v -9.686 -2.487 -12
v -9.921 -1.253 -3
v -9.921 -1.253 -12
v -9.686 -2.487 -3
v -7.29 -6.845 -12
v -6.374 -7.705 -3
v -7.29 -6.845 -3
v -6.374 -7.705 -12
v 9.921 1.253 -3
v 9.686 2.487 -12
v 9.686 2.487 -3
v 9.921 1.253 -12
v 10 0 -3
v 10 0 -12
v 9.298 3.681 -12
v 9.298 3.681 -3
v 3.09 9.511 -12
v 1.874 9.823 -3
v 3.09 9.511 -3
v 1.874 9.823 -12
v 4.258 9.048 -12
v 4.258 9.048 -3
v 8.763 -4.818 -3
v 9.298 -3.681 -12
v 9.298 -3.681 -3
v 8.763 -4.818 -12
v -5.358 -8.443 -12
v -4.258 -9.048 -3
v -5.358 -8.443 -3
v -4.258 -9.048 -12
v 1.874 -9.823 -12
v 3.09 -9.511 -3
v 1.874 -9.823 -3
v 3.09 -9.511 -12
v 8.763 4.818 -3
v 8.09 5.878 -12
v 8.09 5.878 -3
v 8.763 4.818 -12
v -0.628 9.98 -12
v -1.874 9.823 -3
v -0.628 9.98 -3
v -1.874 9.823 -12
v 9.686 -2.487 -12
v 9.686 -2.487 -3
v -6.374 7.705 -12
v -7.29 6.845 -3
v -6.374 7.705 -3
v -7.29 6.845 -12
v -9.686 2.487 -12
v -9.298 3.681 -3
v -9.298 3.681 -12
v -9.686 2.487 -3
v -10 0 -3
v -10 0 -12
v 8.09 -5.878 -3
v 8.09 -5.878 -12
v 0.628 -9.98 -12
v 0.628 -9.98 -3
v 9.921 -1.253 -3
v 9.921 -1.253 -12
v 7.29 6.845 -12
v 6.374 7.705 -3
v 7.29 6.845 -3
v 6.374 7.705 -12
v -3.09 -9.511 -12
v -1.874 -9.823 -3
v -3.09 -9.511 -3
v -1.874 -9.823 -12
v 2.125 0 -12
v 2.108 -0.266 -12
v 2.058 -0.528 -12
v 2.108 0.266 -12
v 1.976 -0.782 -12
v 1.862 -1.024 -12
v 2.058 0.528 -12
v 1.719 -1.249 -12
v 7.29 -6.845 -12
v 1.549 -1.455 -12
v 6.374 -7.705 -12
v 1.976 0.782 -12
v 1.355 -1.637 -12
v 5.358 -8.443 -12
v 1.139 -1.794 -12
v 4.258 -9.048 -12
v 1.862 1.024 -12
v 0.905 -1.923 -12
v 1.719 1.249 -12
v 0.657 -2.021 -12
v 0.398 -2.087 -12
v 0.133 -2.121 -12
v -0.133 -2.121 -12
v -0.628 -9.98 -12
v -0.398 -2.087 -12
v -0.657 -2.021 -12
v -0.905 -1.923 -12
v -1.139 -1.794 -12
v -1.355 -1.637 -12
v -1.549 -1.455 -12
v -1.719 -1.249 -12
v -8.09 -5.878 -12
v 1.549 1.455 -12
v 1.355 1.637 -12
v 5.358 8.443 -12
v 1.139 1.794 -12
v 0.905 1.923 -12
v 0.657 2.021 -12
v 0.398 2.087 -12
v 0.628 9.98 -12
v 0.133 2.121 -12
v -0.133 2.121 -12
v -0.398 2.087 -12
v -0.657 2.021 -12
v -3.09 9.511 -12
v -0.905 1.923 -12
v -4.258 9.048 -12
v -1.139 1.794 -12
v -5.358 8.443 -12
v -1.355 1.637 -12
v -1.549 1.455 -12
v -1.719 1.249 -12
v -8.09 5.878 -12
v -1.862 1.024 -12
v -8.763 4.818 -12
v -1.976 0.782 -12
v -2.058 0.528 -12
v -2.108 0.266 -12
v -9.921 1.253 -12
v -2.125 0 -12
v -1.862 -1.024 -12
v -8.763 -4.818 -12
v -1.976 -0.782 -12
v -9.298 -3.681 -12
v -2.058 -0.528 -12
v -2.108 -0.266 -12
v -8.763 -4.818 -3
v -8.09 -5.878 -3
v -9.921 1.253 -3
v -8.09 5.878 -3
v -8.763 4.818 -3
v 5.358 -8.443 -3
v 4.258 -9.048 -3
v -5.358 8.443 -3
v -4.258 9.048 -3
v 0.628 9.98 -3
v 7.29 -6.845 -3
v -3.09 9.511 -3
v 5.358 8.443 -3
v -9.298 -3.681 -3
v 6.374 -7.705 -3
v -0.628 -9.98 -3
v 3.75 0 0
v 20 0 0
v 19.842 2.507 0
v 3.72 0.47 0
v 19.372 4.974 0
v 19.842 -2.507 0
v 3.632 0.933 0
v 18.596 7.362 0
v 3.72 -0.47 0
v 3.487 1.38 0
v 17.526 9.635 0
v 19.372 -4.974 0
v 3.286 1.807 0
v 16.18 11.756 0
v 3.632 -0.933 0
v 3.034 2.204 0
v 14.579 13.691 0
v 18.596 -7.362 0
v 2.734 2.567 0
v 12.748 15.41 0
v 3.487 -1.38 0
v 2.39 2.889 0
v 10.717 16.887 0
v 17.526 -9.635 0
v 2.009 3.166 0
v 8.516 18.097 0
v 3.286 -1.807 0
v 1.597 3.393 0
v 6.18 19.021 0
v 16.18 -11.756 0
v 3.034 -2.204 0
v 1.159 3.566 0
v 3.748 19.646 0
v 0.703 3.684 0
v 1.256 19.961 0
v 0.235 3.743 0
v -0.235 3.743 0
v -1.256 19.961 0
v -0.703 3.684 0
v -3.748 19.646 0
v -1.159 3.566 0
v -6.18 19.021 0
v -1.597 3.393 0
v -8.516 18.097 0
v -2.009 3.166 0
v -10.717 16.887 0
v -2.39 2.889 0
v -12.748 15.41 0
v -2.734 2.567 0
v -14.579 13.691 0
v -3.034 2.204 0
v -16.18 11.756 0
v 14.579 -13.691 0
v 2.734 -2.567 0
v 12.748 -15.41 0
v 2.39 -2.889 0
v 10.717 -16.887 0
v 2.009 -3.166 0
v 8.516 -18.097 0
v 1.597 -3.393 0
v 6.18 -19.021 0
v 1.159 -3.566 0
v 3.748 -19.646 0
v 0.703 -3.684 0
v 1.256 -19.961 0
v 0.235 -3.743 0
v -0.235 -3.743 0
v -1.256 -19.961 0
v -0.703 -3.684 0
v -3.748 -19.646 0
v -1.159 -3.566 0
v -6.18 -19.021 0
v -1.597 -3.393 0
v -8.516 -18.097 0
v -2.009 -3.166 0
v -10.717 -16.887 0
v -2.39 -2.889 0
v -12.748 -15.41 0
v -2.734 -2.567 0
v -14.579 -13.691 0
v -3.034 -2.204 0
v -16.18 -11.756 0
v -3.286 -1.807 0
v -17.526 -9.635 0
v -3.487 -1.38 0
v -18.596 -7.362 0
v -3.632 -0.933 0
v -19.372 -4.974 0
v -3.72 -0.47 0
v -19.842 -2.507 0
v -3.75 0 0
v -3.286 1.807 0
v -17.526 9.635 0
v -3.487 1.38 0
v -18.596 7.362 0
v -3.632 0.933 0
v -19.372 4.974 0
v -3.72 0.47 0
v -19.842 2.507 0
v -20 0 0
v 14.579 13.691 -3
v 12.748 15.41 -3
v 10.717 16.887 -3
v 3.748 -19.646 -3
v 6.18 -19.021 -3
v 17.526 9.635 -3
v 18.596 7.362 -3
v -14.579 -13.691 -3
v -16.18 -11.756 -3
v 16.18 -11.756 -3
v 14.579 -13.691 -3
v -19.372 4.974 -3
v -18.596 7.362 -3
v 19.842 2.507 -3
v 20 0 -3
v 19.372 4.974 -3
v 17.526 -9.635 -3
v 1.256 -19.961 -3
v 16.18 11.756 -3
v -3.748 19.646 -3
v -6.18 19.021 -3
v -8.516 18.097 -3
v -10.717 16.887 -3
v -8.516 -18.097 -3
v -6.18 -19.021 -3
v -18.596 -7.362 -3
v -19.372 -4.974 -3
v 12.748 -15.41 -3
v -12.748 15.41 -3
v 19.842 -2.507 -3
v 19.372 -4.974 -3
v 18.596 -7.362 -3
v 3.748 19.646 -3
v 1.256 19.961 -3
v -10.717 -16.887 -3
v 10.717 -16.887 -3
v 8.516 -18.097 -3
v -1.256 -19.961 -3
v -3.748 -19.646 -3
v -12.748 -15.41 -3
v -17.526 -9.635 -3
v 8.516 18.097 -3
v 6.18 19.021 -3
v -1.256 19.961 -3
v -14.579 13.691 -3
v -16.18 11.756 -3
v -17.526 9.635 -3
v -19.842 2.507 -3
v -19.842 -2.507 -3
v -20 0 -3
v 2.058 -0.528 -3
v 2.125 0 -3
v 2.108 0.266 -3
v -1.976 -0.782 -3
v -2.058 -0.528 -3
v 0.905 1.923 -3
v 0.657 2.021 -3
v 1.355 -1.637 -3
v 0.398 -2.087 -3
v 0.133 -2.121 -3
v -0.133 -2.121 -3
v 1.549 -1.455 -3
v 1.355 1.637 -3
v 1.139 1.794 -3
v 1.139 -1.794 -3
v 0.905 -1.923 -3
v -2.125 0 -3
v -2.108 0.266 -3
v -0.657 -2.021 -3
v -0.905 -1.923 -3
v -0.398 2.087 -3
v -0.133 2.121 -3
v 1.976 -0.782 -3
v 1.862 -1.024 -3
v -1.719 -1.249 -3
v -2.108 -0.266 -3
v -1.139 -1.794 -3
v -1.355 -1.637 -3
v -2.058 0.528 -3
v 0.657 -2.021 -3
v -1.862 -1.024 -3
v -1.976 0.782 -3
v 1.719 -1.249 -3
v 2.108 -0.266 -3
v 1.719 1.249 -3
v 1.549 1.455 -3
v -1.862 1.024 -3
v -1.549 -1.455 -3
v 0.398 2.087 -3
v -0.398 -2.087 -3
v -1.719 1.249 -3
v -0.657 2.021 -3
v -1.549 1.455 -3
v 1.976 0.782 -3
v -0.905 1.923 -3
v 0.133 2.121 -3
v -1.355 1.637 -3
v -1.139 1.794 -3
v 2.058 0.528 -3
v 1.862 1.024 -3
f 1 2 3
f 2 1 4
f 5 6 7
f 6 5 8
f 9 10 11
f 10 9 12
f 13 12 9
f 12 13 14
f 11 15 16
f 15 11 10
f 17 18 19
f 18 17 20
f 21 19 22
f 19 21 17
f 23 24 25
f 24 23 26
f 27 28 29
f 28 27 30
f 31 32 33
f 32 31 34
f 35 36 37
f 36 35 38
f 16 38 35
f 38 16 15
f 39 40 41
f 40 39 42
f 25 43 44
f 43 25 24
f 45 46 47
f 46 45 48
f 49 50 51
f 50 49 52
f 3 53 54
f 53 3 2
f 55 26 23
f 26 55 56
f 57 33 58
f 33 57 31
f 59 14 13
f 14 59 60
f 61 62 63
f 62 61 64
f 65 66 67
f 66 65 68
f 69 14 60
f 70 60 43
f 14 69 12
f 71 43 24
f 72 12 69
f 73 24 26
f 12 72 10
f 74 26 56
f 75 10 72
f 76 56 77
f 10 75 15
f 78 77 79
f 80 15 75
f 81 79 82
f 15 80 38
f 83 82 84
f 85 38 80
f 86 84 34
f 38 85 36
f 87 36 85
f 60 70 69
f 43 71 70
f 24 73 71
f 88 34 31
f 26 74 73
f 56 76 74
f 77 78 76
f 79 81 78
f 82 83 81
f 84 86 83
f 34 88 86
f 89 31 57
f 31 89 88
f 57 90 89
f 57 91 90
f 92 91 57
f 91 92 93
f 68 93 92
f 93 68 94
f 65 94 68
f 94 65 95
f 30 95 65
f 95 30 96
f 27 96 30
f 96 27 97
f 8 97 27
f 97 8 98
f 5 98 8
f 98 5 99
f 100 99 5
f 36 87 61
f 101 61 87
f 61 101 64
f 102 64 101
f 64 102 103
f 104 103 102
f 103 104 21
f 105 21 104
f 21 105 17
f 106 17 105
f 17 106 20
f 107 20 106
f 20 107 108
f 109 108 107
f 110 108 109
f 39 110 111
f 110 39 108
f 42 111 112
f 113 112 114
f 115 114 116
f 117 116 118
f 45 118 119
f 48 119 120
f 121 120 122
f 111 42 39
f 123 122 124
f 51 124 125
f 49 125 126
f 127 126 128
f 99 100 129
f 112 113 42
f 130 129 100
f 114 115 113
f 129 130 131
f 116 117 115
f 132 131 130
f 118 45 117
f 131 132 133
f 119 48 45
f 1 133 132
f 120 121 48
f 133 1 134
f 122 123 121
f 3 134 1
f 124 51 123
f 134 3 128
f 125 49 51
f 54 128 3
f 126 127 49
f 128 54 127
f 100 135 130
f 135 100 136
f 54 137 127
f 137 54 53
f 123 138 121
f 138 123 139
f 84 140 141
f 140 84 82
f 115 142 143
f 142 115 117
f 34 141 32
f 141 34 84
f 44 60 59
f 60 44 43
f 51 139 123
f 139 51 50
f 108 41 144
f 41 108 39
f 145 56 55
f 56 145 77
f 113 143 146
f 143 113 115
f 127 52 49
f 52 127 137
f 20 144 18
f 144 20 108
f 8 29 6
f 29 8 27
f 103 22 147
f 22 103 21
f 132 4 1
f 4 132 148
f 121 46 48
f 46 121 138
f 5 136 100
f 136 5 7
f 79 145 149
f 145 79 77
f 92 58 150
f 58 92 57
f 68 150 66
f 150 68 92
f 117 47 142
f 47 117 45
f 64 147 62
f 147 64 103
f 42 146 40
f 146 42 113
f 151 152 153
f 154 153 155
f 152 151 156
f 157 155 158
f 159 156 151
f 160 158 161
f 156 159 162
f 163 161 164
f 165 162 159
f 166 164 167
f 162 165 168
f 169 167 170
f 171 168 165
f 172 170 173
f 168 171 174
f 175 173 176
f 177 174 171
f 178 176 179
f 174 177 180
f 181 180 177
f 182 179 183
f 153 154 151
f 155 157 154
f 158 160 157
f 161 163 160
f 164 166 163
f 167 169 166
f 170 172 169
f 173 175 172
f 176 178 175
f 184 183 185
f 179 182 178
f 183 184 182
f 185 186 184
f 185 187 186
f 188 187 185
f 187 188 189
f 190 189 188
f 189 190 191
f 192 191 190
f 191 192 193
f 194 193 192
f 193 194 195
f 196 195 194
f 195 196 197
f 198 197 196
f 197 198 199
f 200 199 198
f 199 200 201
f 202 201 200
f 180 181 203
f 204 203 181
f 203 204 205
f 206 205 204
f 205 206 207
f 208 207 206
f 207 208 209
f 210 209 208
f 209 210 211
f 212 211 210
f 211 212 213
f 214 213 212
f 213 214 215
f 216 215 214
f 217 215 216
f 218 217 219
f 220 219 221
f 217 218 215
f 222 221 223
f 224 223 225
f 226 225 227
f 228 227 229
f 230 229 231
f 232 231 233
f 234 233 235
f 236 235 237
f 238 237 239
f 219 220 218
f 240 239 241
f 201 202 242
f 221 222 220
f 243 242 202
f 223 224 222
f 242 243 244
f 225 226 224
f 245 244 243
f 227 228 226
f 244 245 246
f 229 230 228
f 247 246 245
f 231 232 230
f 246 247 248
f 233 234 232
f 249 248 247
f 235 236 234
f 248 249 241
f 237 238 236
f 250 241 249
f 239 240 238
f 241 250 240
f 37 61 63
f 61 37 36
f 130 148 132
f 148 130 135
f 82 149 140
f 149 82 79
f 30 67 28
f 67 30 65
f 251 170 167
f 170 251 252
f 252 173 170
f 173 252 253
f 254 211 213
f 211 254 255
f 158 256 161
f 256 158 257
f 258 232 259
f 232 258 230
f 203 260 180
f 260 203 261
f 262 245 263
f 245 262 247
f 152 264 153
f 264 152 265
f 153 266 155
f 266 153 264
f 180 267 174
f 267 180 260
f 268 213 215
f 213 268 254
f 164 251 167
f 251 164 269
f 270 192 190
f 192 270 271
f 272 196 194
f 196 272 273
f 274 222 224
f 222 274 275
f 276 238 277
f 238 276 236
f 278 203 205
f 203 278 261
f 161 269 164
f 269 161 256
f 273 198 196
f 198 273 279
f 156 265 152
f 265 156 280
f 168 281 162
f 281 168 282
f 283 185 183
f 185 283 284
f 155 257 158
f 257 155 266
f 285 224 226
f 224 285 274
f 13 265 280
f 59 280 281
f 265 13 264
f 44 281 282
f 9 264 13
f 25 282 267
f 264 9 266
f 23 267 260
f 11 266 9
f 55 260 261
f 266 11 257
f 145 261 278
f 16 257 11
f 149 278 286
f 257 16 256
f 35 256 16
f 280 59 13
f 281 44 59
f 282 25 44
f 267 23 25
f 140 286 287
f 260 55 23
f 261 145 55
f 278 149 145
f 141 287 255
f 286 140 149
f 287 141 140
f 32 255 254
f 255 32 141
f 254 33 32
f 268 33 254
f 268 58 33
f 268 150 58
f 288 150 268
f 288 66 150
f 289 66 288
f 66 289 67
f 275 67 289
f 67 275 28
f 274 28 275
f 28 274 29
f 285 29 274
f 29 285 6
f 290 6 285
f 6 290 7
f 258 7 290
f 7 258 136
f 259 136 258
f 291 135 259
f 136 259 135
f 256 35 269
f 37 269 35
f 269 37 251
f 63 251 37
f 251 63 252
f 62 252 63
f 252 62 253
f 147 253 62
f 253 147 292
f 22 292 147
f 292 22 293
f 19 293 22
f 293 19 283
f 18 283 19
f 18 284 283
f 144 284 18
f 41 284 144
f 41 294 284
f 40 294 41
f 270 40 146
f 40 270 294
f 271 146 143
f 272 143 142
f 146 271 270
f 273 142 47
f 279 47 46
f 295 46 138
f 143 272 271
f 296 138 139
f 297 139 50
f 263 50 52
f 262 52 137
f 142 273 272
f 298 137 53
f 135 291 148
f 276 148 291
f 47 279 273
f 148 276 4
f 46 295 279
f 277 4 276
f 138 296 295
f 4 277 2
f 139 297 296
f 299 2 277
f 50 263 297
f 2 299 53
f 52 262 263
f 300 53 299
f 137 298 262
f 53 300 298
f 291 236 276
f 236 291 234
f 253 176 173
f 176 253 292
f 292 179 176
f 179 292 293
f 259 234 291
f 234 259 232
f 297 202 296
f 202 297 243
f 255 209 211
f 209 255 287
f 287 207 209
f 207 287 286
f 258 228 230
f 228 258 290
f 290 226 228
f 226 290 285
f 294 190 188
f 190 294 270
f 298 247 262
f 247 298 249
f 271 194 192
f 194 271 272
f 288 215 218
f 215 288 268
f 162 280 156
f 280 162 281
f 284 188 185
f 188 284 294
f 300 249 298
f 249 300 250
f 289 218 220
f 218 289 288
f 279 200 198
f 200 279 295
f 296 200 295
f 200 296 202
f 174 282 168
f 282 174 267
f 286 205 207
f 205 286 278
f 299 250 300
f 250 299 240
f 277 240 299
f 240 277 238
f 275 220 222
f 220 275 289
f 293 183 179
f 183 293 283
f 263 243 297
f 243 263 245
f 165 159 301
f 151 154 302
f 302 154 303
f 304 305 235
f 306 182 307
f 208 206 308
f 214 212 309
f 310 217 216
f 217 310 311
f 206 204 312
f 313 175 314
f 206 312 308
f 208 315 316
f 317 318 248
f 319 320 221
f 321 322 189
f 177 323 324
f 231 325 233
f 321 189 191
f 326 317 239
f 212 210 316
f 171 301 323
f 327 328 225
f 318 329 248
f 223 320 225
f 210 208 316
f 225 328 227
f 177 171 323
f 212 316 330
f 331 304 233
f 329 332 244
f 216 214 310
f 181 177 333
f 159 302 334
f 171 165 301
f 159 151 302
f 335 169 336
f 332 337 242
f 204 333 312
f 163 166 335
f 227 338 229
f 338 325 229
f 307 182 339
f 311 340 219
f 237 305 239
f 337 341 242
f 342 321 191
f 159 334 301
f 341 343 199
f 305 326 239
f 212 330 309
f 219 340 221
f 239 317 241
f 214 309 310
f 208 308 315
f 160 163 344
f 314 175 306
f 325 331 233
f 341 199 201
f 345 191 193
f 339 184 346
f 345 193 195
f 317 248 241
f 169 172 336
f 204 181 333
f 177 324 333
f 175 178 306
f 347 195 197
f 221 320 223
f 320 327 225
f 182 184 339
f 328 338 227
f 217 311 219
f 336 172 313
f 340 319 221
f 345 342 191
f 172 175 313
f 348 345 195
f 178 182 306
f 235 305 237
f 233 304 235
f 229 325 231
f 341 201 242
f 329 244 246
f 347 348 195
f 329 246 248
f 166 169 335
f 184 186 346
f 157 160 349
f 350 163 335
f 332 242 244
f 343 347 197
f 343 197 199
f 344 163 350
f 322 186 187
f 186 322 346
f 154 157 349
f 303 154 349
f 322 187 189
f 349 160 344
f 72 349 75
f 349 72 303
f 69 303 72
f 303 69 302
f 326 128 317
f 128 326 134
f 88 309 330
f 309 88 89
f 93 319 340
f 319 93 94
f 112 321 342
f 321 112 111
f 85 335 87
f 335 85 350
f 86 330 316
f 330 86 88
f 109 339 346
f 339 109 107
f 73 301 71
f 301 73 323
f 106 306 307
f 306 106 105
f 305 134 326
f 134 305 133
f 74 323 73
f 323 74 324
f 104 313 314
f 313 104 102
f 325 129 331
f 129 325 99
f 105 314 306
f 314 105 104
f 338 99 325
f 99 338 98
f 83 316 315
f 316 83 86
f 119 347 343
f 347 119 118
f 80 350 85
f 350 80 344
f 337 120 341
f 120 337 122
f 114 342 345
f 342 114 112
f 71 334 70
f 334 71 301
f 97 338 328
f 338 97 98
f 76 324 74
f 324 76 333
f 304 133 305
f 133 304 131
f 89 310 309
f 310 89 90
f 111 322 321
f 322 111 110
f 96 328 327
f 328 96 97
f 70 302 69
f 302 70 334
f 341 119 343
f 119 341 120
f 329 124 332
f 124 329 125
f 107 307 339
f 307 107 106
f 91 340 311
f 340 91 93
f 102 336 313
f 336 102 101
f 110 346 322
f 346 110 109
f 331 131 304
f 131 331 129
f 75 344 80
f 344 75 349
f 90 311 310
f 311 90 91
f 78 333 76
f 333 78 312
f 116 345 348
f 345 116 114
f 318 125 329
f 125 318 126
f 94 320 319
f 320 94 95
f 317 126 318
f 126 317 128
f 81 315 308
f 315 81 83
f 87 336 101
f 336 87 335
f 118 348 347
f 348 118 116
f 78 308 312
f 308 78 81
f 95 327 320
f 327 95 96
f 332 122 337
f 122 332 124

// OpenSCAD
$fn = 50;


difference() {
	union() {
		translate(v = [0, 0, -12.0000000000]) {
			cylinder(h = 12, r = 10.0000000000);
		}
		translate(v = [0, 0, -3.0000000000]) {
			cylinder(h = 3, r = 20.0000000000);
		}
	}
	union() {
		translate(v = [0, 0, 0]) {
			rotate(a = [0, 0, 0]) {
				difference() {
					union() {
						#translate(v = [0, 0, -12.0000000000]) {
							cylinder(h = 12, r = 2.0000000000);
						}
						#translate(v = [0, 0, -3]) {
							cylinder(h = 3, r = 10.0000000000, r1 = 2.1250000000, r2 = 3.7500000000);
						}
						#translate(v = [0, 0, -12.0000000000]) {
							cylinder(h = 12, r = 2.1250000000);
						}
						#translate(v = [0, 0, -12.0000000000]) {
							cylinder(h = 12, r = 2.0000000000);
						}
					}
					union();
				}
			}
		}
	}
}
